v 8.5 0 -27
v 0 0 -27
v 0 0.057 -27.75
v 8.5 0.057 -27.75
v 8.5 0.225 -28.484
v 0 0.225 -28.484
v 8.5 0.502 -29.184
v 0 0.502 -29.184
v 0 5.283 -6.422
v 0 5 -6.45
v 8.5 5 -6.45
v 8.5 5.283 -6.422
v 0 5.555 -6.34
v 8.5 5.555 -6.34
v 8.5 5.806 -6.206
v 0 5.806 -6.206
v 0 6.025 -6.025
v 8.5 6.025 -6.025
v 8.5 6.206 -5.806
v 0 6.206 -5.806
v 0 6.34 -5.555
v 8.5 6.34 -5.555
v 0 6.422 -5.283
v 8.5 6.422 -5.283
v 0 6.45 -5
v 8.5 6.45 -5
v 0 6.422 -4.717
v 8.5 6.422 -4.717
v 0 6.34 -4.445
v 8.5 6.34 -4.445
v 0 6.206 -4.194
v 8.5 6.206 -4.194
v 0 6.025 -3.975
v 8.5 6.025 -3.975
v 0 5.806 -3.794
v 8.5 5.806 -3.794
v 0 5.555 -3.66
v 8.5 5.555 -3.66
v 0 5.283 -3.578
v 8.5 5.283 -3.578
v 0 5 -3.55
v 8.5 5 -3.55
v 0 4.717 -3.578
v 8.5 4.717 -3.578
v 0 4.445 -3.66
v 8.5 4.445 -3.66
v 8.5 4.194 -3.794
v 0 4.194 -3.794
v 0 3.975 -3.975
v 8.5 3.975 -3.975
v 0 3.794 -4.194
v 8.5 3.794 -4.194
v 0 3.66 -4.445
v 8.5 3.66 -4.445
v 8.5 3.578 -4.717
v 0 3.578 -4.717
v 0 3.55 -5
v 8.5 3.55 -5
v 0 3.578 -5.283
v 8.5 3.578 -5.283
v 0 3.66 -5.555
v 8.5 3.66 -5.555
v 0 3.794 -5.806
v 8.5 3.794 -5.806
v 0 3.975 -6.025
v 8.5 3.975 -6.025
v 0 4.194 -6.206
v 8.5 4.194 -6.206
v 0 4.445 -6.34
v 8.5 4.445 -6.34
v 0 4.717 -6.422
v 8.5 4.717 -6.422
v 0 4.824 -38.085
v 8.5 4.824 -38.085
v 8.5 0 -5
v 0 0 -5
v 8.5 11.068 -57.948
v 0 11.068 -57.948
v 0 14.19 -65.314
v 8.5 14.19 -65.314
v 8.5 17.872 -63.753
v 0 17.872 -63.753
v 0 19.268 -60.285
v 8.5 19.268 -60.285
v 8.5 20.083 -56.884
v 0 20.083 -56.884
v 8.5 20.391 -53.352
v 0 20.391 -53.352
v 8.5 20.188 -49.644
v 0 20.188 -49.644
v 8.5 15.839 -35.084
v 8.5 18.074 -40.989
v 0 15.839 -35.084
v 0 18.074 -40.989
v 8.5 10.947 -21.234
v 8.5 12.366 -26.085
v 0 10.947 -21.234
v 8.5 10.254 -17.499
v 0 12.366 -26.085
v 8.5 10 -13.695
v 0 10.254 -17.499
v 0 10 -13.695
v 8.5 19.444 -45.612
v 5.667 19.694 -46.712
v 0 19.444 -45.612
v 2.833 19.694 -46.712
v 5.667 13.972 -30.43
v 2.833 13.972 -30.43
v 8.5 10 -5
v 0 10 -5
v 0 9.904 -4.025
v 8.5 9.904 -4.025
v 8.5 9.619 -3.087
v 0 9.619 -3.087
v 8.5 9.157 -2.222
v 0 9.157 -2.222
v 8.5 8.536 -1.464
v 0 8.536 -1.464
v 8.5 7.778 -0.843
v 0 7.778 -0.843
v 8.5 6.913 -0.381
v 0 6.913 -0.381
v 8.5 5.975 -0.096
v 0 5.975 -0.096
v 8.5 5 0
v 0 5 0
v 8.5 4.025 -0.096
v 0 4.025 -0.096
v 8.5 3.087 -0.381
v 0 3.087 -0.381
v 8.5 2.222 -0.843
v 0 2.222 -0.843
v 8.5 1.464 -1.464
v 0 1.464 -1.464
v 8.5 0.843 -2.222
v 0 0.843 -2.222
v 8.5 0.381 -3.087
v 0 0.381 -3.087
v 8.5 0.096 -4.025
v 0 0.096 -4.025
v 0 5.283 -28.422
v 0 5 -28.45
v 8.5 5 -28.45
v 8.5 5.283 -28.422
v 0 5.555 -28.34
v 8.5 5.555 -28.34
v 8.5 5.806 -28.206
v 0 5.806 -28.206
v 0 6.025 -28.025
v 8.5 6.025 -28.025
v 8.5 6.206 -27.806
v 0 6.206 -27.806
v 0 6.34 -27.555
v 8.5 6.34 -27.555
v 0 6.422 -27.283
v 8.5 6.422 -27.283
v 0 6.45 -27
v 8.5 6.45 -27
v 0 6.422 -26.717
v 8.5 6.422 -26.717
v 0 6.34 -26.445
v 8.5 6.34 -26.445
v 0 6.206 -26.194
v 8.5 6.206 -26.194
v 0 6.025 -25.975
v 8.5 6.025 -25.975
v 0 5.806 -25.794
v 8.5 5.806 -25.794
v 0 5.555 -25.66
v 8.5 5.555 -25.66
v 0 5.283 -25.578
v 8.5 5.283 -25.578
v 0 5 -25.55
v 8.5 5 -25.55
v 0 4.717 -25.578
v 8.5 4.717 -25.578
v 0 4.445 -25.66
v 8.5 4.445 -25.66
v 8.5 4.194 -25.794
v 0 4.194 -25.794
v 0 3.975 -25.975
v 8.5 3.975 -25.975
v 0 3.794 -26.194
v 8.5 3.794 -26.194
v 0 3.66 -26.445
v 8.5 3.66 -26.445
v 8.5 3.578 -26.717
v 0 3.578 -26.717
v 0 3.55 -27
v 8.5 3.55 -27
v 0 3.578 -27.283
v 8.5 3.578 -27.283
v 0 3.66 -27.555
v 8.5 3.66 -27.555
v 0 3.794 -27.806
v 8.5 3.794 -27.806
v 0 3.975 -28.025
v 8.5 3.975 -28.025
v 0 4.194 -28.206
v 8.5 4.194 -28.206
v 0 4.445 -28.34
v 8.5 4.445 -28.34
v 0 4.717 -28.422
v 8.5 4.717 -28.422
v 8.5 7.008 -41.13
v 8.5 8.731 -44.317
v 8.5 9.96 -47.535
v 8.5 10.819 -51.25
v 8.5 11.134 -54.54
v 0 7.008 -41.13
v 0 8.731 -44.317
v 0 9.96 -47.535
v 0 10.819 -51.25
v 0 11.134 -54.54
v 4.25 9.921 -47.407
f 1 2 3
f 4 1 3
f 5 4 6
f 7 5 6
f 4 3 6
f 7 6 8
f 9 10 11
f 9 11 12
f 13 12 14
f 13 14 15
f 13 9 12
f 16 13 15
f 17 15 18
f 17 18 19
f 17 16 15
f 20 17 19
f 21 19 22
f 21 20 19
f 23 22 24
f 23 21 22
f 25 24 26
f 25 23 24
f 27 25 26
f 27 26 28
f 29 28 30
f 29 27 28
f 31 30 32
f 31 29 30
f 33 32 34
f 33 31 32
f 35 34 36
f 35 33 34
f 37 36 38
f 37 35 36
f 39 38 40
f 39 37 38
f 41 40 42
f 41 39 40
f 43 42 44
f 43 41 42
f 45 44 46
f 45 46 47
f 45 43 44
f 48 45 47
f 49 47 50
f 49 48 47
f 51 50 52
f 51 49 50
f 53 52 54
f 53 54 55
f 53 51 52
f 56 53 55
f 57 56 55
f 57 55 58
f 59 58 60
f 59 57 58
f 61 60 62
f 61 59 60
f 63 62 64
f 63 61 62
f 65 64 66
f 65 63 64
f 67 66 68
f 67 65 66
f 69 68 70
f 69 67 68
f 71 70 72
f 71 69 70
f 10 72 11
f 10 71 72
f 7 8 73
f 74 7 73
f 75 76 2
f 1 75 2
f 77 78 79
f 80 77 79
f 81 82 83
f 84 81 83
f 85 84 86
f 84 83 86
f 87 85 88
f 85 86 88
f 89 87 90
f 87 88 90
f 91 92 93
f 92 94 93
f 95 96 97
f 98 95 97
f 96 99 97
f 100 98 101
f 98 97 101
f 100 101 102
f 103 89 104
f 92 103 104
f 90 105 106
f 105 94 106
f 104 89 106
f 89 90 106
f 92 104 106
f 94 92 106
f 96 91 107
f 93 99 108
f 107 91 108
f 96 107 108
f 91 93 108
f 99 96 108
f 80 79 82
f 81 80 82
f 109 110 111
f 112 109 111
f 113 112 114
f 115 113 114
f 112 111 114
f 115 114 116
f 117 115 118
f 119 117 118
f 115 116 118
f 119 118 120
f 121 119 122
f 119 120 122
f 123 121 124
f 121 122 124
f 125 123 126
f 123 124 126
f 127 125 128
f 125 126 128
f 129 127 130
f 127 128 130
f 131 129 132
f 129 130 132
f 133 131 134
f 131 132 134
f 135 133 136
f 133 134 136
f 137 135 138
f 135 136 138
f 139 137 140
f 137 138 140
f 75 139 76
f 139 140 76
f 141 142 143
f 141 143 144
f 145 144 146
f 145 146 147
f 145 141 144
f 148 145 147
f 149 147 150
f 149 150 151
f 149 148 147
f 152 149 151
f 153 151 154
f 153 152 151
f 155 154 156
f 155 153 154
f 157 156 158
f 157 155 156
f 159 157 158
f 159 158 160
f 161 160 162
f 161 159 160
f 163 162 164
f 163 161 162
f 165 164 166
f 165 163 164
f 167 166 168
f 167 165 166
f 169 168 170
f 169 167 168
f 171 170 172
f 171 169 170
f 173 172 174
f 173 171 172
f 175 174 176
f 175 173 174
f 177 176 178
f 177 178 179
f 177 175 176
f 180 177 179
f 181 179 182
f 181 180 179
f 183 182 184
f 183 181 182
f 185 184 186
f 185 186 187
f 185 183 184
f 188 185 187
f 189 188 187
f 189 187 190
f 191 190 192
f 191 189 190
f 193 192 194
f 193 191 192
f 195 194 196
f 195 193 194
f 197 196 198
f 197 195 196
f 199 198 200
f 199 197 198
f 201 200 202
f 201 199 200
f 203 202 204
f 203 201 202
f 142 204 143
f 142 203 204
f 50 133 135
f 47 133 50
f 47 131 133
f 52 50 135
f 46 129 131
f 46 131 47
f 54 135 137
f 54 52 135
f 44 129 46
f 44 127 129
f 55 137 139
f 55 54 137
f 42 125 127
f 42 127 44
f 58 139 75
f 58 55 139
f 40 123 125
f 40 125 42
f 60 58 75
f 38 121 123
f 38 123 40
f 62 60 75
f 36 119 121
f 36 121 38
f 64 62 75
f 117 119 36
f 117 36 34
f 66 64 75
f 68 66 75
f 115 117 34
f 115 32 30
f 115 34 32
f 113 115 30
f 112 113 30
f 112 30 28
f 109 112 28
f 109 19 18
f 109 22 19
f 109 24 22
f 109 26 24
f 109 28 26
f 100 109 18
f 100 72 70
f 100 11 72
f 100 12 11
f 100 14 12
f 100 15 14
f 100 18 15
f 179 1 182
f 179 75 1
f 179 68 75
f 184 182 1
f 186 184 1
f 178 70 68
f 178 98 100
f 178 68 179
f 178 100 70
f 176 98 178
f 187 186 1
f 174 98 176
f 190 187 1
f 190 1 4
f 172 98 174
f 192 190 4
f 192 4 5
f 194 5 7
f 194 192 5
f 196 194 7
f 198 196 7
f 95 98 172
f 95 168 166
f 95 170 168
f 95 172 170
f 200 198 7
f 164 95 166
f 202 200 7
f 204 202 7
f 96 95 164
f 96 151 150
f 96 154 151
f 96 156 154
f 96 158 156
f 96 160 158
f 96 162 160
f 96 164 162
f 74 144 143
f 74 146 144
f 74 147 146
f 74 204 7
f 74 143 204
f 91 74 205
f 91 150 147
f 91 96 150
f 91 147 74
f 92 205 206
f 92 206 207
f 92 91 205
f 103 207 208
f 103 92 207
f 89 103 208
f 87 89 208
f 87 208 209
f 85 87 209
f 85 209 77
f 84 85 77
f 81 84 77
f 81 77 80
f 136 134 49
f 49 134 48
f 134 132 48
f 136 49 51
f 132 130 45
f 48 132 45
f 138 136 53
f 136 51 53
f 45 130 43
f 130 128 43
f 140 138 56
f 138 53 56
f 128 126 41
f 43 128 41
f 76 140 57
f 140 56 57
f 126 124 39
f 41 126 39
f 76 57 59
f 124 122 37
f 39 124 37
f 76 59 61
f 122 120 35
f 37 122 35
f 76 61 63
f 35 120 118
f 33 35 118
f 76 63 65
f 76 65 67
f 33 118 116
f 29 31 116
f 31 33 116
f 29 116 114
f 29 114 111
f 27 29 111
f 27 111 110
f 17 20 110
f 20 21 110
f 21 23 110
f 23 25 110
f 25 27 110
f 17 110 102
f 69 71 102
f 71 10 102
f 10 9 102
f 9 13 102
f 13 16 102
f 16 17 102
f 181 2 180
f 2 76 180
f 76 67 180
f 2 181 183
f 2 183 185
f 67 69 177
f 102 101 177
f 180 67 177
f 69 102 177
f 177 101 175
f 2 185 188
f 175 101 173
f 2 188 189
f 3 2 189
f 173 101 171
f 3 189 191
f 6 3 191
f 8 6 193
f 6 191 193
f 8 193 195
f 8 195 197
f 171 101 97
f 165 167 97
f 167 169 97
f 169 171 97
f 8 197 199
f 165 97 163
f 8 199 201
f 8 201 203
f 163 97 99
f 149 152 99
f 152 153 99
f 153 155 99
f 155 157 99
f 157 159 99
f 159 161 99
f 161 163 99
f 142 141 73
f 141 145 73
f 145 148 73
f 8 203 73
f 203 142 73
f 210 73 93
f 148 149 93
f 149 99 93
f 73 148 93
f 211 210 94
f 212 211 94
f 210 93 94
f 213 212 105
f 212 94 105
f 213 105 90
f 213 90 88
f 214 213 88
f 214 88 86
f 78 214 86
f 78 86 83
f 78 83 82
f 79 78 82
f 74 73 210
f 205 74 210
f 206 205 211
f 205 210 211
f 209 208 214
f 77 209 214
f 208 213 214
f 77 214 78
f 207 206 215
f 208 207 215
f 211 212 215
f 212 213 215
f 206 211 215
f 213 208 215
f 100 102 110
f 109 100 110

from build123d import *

# Parameters (mm, degrees)
SKETCH1_R           = 1.45
BOSS_EXTRUDE1_DEPTH = 8.5
BOSS_EXTRUDE2_START = -8.5
BOSS_EXTRUDE2_DEPTH = 8.5


with BuildPart() as part:
    # Sketch1 → Boss-Extrude1 (new body)
    with BuildSketch(Plane(origin=(0, 0, 0), x_dir=(0, 0, -1), z_dir=(1, 0, 0))):
        with BuildLine():
            Line((27, 10), (5, 10))
            ThreePointArc((5, 10), (0, 5), (5, 0))
            Line((5, 0), (27, 0))
            ThreePointArc((27, 0), (32, 5), (27, 10))
        make_face()
        with Locations((5, 5)):
            Circle(SKETCH1_R, mode=Mode.SUBTRACT)
        with Locations((27, 5)):
            Circle(SKETCH1_R, mode=Mode.SUBTRACT)
    extrude(amount=BOSS_EXTRUDE1_DEPTH)

    # Sketch2 → Boss-Extrude2 (add)
    with BuildSketch(Plane(origin=(8.5, 0, 0), x_dir=(0, 0, -1), z_dir=(1, 0, 0)).offset(BOSS_EXTRUDE2_START)):
        with BuildLine():
            add(Edge.make_bspline(
                [(63.752972286, 17.872423117), (45.928882678, 26.563787963), (31.059268621, 10), (13.694974759, 10)],
                knots=[0, 0, 0, 0, 1, 1, 1, 1], degree=3))
            Line((13.694974759, 10), (27, 10))
            ThreePointArc((27, 10), (31.87285141, 6.120410255), (29.183837075, 0.502127655))
            Line((29.183837075, 0.502127655), (38.08542066, 4.824084077))
            add(Edge.make_bspline(
                [(38.08542066, 4.824084077), (46.797509509, 11.895222457), (57.948000409, 11.067843667)],
                knots=[0, 0, 0, 1, 1, 1], degree=2))
            Line((57.948000409, 11.067843667), (65.313809691, 14.189518476))
            Line((65.313809691, 14.189518476), (63.752972286, 17.872423117))
        make_face()
    extrude(amount=BOSS_EXTRUDE2_DEPTH)


solid = part.part
